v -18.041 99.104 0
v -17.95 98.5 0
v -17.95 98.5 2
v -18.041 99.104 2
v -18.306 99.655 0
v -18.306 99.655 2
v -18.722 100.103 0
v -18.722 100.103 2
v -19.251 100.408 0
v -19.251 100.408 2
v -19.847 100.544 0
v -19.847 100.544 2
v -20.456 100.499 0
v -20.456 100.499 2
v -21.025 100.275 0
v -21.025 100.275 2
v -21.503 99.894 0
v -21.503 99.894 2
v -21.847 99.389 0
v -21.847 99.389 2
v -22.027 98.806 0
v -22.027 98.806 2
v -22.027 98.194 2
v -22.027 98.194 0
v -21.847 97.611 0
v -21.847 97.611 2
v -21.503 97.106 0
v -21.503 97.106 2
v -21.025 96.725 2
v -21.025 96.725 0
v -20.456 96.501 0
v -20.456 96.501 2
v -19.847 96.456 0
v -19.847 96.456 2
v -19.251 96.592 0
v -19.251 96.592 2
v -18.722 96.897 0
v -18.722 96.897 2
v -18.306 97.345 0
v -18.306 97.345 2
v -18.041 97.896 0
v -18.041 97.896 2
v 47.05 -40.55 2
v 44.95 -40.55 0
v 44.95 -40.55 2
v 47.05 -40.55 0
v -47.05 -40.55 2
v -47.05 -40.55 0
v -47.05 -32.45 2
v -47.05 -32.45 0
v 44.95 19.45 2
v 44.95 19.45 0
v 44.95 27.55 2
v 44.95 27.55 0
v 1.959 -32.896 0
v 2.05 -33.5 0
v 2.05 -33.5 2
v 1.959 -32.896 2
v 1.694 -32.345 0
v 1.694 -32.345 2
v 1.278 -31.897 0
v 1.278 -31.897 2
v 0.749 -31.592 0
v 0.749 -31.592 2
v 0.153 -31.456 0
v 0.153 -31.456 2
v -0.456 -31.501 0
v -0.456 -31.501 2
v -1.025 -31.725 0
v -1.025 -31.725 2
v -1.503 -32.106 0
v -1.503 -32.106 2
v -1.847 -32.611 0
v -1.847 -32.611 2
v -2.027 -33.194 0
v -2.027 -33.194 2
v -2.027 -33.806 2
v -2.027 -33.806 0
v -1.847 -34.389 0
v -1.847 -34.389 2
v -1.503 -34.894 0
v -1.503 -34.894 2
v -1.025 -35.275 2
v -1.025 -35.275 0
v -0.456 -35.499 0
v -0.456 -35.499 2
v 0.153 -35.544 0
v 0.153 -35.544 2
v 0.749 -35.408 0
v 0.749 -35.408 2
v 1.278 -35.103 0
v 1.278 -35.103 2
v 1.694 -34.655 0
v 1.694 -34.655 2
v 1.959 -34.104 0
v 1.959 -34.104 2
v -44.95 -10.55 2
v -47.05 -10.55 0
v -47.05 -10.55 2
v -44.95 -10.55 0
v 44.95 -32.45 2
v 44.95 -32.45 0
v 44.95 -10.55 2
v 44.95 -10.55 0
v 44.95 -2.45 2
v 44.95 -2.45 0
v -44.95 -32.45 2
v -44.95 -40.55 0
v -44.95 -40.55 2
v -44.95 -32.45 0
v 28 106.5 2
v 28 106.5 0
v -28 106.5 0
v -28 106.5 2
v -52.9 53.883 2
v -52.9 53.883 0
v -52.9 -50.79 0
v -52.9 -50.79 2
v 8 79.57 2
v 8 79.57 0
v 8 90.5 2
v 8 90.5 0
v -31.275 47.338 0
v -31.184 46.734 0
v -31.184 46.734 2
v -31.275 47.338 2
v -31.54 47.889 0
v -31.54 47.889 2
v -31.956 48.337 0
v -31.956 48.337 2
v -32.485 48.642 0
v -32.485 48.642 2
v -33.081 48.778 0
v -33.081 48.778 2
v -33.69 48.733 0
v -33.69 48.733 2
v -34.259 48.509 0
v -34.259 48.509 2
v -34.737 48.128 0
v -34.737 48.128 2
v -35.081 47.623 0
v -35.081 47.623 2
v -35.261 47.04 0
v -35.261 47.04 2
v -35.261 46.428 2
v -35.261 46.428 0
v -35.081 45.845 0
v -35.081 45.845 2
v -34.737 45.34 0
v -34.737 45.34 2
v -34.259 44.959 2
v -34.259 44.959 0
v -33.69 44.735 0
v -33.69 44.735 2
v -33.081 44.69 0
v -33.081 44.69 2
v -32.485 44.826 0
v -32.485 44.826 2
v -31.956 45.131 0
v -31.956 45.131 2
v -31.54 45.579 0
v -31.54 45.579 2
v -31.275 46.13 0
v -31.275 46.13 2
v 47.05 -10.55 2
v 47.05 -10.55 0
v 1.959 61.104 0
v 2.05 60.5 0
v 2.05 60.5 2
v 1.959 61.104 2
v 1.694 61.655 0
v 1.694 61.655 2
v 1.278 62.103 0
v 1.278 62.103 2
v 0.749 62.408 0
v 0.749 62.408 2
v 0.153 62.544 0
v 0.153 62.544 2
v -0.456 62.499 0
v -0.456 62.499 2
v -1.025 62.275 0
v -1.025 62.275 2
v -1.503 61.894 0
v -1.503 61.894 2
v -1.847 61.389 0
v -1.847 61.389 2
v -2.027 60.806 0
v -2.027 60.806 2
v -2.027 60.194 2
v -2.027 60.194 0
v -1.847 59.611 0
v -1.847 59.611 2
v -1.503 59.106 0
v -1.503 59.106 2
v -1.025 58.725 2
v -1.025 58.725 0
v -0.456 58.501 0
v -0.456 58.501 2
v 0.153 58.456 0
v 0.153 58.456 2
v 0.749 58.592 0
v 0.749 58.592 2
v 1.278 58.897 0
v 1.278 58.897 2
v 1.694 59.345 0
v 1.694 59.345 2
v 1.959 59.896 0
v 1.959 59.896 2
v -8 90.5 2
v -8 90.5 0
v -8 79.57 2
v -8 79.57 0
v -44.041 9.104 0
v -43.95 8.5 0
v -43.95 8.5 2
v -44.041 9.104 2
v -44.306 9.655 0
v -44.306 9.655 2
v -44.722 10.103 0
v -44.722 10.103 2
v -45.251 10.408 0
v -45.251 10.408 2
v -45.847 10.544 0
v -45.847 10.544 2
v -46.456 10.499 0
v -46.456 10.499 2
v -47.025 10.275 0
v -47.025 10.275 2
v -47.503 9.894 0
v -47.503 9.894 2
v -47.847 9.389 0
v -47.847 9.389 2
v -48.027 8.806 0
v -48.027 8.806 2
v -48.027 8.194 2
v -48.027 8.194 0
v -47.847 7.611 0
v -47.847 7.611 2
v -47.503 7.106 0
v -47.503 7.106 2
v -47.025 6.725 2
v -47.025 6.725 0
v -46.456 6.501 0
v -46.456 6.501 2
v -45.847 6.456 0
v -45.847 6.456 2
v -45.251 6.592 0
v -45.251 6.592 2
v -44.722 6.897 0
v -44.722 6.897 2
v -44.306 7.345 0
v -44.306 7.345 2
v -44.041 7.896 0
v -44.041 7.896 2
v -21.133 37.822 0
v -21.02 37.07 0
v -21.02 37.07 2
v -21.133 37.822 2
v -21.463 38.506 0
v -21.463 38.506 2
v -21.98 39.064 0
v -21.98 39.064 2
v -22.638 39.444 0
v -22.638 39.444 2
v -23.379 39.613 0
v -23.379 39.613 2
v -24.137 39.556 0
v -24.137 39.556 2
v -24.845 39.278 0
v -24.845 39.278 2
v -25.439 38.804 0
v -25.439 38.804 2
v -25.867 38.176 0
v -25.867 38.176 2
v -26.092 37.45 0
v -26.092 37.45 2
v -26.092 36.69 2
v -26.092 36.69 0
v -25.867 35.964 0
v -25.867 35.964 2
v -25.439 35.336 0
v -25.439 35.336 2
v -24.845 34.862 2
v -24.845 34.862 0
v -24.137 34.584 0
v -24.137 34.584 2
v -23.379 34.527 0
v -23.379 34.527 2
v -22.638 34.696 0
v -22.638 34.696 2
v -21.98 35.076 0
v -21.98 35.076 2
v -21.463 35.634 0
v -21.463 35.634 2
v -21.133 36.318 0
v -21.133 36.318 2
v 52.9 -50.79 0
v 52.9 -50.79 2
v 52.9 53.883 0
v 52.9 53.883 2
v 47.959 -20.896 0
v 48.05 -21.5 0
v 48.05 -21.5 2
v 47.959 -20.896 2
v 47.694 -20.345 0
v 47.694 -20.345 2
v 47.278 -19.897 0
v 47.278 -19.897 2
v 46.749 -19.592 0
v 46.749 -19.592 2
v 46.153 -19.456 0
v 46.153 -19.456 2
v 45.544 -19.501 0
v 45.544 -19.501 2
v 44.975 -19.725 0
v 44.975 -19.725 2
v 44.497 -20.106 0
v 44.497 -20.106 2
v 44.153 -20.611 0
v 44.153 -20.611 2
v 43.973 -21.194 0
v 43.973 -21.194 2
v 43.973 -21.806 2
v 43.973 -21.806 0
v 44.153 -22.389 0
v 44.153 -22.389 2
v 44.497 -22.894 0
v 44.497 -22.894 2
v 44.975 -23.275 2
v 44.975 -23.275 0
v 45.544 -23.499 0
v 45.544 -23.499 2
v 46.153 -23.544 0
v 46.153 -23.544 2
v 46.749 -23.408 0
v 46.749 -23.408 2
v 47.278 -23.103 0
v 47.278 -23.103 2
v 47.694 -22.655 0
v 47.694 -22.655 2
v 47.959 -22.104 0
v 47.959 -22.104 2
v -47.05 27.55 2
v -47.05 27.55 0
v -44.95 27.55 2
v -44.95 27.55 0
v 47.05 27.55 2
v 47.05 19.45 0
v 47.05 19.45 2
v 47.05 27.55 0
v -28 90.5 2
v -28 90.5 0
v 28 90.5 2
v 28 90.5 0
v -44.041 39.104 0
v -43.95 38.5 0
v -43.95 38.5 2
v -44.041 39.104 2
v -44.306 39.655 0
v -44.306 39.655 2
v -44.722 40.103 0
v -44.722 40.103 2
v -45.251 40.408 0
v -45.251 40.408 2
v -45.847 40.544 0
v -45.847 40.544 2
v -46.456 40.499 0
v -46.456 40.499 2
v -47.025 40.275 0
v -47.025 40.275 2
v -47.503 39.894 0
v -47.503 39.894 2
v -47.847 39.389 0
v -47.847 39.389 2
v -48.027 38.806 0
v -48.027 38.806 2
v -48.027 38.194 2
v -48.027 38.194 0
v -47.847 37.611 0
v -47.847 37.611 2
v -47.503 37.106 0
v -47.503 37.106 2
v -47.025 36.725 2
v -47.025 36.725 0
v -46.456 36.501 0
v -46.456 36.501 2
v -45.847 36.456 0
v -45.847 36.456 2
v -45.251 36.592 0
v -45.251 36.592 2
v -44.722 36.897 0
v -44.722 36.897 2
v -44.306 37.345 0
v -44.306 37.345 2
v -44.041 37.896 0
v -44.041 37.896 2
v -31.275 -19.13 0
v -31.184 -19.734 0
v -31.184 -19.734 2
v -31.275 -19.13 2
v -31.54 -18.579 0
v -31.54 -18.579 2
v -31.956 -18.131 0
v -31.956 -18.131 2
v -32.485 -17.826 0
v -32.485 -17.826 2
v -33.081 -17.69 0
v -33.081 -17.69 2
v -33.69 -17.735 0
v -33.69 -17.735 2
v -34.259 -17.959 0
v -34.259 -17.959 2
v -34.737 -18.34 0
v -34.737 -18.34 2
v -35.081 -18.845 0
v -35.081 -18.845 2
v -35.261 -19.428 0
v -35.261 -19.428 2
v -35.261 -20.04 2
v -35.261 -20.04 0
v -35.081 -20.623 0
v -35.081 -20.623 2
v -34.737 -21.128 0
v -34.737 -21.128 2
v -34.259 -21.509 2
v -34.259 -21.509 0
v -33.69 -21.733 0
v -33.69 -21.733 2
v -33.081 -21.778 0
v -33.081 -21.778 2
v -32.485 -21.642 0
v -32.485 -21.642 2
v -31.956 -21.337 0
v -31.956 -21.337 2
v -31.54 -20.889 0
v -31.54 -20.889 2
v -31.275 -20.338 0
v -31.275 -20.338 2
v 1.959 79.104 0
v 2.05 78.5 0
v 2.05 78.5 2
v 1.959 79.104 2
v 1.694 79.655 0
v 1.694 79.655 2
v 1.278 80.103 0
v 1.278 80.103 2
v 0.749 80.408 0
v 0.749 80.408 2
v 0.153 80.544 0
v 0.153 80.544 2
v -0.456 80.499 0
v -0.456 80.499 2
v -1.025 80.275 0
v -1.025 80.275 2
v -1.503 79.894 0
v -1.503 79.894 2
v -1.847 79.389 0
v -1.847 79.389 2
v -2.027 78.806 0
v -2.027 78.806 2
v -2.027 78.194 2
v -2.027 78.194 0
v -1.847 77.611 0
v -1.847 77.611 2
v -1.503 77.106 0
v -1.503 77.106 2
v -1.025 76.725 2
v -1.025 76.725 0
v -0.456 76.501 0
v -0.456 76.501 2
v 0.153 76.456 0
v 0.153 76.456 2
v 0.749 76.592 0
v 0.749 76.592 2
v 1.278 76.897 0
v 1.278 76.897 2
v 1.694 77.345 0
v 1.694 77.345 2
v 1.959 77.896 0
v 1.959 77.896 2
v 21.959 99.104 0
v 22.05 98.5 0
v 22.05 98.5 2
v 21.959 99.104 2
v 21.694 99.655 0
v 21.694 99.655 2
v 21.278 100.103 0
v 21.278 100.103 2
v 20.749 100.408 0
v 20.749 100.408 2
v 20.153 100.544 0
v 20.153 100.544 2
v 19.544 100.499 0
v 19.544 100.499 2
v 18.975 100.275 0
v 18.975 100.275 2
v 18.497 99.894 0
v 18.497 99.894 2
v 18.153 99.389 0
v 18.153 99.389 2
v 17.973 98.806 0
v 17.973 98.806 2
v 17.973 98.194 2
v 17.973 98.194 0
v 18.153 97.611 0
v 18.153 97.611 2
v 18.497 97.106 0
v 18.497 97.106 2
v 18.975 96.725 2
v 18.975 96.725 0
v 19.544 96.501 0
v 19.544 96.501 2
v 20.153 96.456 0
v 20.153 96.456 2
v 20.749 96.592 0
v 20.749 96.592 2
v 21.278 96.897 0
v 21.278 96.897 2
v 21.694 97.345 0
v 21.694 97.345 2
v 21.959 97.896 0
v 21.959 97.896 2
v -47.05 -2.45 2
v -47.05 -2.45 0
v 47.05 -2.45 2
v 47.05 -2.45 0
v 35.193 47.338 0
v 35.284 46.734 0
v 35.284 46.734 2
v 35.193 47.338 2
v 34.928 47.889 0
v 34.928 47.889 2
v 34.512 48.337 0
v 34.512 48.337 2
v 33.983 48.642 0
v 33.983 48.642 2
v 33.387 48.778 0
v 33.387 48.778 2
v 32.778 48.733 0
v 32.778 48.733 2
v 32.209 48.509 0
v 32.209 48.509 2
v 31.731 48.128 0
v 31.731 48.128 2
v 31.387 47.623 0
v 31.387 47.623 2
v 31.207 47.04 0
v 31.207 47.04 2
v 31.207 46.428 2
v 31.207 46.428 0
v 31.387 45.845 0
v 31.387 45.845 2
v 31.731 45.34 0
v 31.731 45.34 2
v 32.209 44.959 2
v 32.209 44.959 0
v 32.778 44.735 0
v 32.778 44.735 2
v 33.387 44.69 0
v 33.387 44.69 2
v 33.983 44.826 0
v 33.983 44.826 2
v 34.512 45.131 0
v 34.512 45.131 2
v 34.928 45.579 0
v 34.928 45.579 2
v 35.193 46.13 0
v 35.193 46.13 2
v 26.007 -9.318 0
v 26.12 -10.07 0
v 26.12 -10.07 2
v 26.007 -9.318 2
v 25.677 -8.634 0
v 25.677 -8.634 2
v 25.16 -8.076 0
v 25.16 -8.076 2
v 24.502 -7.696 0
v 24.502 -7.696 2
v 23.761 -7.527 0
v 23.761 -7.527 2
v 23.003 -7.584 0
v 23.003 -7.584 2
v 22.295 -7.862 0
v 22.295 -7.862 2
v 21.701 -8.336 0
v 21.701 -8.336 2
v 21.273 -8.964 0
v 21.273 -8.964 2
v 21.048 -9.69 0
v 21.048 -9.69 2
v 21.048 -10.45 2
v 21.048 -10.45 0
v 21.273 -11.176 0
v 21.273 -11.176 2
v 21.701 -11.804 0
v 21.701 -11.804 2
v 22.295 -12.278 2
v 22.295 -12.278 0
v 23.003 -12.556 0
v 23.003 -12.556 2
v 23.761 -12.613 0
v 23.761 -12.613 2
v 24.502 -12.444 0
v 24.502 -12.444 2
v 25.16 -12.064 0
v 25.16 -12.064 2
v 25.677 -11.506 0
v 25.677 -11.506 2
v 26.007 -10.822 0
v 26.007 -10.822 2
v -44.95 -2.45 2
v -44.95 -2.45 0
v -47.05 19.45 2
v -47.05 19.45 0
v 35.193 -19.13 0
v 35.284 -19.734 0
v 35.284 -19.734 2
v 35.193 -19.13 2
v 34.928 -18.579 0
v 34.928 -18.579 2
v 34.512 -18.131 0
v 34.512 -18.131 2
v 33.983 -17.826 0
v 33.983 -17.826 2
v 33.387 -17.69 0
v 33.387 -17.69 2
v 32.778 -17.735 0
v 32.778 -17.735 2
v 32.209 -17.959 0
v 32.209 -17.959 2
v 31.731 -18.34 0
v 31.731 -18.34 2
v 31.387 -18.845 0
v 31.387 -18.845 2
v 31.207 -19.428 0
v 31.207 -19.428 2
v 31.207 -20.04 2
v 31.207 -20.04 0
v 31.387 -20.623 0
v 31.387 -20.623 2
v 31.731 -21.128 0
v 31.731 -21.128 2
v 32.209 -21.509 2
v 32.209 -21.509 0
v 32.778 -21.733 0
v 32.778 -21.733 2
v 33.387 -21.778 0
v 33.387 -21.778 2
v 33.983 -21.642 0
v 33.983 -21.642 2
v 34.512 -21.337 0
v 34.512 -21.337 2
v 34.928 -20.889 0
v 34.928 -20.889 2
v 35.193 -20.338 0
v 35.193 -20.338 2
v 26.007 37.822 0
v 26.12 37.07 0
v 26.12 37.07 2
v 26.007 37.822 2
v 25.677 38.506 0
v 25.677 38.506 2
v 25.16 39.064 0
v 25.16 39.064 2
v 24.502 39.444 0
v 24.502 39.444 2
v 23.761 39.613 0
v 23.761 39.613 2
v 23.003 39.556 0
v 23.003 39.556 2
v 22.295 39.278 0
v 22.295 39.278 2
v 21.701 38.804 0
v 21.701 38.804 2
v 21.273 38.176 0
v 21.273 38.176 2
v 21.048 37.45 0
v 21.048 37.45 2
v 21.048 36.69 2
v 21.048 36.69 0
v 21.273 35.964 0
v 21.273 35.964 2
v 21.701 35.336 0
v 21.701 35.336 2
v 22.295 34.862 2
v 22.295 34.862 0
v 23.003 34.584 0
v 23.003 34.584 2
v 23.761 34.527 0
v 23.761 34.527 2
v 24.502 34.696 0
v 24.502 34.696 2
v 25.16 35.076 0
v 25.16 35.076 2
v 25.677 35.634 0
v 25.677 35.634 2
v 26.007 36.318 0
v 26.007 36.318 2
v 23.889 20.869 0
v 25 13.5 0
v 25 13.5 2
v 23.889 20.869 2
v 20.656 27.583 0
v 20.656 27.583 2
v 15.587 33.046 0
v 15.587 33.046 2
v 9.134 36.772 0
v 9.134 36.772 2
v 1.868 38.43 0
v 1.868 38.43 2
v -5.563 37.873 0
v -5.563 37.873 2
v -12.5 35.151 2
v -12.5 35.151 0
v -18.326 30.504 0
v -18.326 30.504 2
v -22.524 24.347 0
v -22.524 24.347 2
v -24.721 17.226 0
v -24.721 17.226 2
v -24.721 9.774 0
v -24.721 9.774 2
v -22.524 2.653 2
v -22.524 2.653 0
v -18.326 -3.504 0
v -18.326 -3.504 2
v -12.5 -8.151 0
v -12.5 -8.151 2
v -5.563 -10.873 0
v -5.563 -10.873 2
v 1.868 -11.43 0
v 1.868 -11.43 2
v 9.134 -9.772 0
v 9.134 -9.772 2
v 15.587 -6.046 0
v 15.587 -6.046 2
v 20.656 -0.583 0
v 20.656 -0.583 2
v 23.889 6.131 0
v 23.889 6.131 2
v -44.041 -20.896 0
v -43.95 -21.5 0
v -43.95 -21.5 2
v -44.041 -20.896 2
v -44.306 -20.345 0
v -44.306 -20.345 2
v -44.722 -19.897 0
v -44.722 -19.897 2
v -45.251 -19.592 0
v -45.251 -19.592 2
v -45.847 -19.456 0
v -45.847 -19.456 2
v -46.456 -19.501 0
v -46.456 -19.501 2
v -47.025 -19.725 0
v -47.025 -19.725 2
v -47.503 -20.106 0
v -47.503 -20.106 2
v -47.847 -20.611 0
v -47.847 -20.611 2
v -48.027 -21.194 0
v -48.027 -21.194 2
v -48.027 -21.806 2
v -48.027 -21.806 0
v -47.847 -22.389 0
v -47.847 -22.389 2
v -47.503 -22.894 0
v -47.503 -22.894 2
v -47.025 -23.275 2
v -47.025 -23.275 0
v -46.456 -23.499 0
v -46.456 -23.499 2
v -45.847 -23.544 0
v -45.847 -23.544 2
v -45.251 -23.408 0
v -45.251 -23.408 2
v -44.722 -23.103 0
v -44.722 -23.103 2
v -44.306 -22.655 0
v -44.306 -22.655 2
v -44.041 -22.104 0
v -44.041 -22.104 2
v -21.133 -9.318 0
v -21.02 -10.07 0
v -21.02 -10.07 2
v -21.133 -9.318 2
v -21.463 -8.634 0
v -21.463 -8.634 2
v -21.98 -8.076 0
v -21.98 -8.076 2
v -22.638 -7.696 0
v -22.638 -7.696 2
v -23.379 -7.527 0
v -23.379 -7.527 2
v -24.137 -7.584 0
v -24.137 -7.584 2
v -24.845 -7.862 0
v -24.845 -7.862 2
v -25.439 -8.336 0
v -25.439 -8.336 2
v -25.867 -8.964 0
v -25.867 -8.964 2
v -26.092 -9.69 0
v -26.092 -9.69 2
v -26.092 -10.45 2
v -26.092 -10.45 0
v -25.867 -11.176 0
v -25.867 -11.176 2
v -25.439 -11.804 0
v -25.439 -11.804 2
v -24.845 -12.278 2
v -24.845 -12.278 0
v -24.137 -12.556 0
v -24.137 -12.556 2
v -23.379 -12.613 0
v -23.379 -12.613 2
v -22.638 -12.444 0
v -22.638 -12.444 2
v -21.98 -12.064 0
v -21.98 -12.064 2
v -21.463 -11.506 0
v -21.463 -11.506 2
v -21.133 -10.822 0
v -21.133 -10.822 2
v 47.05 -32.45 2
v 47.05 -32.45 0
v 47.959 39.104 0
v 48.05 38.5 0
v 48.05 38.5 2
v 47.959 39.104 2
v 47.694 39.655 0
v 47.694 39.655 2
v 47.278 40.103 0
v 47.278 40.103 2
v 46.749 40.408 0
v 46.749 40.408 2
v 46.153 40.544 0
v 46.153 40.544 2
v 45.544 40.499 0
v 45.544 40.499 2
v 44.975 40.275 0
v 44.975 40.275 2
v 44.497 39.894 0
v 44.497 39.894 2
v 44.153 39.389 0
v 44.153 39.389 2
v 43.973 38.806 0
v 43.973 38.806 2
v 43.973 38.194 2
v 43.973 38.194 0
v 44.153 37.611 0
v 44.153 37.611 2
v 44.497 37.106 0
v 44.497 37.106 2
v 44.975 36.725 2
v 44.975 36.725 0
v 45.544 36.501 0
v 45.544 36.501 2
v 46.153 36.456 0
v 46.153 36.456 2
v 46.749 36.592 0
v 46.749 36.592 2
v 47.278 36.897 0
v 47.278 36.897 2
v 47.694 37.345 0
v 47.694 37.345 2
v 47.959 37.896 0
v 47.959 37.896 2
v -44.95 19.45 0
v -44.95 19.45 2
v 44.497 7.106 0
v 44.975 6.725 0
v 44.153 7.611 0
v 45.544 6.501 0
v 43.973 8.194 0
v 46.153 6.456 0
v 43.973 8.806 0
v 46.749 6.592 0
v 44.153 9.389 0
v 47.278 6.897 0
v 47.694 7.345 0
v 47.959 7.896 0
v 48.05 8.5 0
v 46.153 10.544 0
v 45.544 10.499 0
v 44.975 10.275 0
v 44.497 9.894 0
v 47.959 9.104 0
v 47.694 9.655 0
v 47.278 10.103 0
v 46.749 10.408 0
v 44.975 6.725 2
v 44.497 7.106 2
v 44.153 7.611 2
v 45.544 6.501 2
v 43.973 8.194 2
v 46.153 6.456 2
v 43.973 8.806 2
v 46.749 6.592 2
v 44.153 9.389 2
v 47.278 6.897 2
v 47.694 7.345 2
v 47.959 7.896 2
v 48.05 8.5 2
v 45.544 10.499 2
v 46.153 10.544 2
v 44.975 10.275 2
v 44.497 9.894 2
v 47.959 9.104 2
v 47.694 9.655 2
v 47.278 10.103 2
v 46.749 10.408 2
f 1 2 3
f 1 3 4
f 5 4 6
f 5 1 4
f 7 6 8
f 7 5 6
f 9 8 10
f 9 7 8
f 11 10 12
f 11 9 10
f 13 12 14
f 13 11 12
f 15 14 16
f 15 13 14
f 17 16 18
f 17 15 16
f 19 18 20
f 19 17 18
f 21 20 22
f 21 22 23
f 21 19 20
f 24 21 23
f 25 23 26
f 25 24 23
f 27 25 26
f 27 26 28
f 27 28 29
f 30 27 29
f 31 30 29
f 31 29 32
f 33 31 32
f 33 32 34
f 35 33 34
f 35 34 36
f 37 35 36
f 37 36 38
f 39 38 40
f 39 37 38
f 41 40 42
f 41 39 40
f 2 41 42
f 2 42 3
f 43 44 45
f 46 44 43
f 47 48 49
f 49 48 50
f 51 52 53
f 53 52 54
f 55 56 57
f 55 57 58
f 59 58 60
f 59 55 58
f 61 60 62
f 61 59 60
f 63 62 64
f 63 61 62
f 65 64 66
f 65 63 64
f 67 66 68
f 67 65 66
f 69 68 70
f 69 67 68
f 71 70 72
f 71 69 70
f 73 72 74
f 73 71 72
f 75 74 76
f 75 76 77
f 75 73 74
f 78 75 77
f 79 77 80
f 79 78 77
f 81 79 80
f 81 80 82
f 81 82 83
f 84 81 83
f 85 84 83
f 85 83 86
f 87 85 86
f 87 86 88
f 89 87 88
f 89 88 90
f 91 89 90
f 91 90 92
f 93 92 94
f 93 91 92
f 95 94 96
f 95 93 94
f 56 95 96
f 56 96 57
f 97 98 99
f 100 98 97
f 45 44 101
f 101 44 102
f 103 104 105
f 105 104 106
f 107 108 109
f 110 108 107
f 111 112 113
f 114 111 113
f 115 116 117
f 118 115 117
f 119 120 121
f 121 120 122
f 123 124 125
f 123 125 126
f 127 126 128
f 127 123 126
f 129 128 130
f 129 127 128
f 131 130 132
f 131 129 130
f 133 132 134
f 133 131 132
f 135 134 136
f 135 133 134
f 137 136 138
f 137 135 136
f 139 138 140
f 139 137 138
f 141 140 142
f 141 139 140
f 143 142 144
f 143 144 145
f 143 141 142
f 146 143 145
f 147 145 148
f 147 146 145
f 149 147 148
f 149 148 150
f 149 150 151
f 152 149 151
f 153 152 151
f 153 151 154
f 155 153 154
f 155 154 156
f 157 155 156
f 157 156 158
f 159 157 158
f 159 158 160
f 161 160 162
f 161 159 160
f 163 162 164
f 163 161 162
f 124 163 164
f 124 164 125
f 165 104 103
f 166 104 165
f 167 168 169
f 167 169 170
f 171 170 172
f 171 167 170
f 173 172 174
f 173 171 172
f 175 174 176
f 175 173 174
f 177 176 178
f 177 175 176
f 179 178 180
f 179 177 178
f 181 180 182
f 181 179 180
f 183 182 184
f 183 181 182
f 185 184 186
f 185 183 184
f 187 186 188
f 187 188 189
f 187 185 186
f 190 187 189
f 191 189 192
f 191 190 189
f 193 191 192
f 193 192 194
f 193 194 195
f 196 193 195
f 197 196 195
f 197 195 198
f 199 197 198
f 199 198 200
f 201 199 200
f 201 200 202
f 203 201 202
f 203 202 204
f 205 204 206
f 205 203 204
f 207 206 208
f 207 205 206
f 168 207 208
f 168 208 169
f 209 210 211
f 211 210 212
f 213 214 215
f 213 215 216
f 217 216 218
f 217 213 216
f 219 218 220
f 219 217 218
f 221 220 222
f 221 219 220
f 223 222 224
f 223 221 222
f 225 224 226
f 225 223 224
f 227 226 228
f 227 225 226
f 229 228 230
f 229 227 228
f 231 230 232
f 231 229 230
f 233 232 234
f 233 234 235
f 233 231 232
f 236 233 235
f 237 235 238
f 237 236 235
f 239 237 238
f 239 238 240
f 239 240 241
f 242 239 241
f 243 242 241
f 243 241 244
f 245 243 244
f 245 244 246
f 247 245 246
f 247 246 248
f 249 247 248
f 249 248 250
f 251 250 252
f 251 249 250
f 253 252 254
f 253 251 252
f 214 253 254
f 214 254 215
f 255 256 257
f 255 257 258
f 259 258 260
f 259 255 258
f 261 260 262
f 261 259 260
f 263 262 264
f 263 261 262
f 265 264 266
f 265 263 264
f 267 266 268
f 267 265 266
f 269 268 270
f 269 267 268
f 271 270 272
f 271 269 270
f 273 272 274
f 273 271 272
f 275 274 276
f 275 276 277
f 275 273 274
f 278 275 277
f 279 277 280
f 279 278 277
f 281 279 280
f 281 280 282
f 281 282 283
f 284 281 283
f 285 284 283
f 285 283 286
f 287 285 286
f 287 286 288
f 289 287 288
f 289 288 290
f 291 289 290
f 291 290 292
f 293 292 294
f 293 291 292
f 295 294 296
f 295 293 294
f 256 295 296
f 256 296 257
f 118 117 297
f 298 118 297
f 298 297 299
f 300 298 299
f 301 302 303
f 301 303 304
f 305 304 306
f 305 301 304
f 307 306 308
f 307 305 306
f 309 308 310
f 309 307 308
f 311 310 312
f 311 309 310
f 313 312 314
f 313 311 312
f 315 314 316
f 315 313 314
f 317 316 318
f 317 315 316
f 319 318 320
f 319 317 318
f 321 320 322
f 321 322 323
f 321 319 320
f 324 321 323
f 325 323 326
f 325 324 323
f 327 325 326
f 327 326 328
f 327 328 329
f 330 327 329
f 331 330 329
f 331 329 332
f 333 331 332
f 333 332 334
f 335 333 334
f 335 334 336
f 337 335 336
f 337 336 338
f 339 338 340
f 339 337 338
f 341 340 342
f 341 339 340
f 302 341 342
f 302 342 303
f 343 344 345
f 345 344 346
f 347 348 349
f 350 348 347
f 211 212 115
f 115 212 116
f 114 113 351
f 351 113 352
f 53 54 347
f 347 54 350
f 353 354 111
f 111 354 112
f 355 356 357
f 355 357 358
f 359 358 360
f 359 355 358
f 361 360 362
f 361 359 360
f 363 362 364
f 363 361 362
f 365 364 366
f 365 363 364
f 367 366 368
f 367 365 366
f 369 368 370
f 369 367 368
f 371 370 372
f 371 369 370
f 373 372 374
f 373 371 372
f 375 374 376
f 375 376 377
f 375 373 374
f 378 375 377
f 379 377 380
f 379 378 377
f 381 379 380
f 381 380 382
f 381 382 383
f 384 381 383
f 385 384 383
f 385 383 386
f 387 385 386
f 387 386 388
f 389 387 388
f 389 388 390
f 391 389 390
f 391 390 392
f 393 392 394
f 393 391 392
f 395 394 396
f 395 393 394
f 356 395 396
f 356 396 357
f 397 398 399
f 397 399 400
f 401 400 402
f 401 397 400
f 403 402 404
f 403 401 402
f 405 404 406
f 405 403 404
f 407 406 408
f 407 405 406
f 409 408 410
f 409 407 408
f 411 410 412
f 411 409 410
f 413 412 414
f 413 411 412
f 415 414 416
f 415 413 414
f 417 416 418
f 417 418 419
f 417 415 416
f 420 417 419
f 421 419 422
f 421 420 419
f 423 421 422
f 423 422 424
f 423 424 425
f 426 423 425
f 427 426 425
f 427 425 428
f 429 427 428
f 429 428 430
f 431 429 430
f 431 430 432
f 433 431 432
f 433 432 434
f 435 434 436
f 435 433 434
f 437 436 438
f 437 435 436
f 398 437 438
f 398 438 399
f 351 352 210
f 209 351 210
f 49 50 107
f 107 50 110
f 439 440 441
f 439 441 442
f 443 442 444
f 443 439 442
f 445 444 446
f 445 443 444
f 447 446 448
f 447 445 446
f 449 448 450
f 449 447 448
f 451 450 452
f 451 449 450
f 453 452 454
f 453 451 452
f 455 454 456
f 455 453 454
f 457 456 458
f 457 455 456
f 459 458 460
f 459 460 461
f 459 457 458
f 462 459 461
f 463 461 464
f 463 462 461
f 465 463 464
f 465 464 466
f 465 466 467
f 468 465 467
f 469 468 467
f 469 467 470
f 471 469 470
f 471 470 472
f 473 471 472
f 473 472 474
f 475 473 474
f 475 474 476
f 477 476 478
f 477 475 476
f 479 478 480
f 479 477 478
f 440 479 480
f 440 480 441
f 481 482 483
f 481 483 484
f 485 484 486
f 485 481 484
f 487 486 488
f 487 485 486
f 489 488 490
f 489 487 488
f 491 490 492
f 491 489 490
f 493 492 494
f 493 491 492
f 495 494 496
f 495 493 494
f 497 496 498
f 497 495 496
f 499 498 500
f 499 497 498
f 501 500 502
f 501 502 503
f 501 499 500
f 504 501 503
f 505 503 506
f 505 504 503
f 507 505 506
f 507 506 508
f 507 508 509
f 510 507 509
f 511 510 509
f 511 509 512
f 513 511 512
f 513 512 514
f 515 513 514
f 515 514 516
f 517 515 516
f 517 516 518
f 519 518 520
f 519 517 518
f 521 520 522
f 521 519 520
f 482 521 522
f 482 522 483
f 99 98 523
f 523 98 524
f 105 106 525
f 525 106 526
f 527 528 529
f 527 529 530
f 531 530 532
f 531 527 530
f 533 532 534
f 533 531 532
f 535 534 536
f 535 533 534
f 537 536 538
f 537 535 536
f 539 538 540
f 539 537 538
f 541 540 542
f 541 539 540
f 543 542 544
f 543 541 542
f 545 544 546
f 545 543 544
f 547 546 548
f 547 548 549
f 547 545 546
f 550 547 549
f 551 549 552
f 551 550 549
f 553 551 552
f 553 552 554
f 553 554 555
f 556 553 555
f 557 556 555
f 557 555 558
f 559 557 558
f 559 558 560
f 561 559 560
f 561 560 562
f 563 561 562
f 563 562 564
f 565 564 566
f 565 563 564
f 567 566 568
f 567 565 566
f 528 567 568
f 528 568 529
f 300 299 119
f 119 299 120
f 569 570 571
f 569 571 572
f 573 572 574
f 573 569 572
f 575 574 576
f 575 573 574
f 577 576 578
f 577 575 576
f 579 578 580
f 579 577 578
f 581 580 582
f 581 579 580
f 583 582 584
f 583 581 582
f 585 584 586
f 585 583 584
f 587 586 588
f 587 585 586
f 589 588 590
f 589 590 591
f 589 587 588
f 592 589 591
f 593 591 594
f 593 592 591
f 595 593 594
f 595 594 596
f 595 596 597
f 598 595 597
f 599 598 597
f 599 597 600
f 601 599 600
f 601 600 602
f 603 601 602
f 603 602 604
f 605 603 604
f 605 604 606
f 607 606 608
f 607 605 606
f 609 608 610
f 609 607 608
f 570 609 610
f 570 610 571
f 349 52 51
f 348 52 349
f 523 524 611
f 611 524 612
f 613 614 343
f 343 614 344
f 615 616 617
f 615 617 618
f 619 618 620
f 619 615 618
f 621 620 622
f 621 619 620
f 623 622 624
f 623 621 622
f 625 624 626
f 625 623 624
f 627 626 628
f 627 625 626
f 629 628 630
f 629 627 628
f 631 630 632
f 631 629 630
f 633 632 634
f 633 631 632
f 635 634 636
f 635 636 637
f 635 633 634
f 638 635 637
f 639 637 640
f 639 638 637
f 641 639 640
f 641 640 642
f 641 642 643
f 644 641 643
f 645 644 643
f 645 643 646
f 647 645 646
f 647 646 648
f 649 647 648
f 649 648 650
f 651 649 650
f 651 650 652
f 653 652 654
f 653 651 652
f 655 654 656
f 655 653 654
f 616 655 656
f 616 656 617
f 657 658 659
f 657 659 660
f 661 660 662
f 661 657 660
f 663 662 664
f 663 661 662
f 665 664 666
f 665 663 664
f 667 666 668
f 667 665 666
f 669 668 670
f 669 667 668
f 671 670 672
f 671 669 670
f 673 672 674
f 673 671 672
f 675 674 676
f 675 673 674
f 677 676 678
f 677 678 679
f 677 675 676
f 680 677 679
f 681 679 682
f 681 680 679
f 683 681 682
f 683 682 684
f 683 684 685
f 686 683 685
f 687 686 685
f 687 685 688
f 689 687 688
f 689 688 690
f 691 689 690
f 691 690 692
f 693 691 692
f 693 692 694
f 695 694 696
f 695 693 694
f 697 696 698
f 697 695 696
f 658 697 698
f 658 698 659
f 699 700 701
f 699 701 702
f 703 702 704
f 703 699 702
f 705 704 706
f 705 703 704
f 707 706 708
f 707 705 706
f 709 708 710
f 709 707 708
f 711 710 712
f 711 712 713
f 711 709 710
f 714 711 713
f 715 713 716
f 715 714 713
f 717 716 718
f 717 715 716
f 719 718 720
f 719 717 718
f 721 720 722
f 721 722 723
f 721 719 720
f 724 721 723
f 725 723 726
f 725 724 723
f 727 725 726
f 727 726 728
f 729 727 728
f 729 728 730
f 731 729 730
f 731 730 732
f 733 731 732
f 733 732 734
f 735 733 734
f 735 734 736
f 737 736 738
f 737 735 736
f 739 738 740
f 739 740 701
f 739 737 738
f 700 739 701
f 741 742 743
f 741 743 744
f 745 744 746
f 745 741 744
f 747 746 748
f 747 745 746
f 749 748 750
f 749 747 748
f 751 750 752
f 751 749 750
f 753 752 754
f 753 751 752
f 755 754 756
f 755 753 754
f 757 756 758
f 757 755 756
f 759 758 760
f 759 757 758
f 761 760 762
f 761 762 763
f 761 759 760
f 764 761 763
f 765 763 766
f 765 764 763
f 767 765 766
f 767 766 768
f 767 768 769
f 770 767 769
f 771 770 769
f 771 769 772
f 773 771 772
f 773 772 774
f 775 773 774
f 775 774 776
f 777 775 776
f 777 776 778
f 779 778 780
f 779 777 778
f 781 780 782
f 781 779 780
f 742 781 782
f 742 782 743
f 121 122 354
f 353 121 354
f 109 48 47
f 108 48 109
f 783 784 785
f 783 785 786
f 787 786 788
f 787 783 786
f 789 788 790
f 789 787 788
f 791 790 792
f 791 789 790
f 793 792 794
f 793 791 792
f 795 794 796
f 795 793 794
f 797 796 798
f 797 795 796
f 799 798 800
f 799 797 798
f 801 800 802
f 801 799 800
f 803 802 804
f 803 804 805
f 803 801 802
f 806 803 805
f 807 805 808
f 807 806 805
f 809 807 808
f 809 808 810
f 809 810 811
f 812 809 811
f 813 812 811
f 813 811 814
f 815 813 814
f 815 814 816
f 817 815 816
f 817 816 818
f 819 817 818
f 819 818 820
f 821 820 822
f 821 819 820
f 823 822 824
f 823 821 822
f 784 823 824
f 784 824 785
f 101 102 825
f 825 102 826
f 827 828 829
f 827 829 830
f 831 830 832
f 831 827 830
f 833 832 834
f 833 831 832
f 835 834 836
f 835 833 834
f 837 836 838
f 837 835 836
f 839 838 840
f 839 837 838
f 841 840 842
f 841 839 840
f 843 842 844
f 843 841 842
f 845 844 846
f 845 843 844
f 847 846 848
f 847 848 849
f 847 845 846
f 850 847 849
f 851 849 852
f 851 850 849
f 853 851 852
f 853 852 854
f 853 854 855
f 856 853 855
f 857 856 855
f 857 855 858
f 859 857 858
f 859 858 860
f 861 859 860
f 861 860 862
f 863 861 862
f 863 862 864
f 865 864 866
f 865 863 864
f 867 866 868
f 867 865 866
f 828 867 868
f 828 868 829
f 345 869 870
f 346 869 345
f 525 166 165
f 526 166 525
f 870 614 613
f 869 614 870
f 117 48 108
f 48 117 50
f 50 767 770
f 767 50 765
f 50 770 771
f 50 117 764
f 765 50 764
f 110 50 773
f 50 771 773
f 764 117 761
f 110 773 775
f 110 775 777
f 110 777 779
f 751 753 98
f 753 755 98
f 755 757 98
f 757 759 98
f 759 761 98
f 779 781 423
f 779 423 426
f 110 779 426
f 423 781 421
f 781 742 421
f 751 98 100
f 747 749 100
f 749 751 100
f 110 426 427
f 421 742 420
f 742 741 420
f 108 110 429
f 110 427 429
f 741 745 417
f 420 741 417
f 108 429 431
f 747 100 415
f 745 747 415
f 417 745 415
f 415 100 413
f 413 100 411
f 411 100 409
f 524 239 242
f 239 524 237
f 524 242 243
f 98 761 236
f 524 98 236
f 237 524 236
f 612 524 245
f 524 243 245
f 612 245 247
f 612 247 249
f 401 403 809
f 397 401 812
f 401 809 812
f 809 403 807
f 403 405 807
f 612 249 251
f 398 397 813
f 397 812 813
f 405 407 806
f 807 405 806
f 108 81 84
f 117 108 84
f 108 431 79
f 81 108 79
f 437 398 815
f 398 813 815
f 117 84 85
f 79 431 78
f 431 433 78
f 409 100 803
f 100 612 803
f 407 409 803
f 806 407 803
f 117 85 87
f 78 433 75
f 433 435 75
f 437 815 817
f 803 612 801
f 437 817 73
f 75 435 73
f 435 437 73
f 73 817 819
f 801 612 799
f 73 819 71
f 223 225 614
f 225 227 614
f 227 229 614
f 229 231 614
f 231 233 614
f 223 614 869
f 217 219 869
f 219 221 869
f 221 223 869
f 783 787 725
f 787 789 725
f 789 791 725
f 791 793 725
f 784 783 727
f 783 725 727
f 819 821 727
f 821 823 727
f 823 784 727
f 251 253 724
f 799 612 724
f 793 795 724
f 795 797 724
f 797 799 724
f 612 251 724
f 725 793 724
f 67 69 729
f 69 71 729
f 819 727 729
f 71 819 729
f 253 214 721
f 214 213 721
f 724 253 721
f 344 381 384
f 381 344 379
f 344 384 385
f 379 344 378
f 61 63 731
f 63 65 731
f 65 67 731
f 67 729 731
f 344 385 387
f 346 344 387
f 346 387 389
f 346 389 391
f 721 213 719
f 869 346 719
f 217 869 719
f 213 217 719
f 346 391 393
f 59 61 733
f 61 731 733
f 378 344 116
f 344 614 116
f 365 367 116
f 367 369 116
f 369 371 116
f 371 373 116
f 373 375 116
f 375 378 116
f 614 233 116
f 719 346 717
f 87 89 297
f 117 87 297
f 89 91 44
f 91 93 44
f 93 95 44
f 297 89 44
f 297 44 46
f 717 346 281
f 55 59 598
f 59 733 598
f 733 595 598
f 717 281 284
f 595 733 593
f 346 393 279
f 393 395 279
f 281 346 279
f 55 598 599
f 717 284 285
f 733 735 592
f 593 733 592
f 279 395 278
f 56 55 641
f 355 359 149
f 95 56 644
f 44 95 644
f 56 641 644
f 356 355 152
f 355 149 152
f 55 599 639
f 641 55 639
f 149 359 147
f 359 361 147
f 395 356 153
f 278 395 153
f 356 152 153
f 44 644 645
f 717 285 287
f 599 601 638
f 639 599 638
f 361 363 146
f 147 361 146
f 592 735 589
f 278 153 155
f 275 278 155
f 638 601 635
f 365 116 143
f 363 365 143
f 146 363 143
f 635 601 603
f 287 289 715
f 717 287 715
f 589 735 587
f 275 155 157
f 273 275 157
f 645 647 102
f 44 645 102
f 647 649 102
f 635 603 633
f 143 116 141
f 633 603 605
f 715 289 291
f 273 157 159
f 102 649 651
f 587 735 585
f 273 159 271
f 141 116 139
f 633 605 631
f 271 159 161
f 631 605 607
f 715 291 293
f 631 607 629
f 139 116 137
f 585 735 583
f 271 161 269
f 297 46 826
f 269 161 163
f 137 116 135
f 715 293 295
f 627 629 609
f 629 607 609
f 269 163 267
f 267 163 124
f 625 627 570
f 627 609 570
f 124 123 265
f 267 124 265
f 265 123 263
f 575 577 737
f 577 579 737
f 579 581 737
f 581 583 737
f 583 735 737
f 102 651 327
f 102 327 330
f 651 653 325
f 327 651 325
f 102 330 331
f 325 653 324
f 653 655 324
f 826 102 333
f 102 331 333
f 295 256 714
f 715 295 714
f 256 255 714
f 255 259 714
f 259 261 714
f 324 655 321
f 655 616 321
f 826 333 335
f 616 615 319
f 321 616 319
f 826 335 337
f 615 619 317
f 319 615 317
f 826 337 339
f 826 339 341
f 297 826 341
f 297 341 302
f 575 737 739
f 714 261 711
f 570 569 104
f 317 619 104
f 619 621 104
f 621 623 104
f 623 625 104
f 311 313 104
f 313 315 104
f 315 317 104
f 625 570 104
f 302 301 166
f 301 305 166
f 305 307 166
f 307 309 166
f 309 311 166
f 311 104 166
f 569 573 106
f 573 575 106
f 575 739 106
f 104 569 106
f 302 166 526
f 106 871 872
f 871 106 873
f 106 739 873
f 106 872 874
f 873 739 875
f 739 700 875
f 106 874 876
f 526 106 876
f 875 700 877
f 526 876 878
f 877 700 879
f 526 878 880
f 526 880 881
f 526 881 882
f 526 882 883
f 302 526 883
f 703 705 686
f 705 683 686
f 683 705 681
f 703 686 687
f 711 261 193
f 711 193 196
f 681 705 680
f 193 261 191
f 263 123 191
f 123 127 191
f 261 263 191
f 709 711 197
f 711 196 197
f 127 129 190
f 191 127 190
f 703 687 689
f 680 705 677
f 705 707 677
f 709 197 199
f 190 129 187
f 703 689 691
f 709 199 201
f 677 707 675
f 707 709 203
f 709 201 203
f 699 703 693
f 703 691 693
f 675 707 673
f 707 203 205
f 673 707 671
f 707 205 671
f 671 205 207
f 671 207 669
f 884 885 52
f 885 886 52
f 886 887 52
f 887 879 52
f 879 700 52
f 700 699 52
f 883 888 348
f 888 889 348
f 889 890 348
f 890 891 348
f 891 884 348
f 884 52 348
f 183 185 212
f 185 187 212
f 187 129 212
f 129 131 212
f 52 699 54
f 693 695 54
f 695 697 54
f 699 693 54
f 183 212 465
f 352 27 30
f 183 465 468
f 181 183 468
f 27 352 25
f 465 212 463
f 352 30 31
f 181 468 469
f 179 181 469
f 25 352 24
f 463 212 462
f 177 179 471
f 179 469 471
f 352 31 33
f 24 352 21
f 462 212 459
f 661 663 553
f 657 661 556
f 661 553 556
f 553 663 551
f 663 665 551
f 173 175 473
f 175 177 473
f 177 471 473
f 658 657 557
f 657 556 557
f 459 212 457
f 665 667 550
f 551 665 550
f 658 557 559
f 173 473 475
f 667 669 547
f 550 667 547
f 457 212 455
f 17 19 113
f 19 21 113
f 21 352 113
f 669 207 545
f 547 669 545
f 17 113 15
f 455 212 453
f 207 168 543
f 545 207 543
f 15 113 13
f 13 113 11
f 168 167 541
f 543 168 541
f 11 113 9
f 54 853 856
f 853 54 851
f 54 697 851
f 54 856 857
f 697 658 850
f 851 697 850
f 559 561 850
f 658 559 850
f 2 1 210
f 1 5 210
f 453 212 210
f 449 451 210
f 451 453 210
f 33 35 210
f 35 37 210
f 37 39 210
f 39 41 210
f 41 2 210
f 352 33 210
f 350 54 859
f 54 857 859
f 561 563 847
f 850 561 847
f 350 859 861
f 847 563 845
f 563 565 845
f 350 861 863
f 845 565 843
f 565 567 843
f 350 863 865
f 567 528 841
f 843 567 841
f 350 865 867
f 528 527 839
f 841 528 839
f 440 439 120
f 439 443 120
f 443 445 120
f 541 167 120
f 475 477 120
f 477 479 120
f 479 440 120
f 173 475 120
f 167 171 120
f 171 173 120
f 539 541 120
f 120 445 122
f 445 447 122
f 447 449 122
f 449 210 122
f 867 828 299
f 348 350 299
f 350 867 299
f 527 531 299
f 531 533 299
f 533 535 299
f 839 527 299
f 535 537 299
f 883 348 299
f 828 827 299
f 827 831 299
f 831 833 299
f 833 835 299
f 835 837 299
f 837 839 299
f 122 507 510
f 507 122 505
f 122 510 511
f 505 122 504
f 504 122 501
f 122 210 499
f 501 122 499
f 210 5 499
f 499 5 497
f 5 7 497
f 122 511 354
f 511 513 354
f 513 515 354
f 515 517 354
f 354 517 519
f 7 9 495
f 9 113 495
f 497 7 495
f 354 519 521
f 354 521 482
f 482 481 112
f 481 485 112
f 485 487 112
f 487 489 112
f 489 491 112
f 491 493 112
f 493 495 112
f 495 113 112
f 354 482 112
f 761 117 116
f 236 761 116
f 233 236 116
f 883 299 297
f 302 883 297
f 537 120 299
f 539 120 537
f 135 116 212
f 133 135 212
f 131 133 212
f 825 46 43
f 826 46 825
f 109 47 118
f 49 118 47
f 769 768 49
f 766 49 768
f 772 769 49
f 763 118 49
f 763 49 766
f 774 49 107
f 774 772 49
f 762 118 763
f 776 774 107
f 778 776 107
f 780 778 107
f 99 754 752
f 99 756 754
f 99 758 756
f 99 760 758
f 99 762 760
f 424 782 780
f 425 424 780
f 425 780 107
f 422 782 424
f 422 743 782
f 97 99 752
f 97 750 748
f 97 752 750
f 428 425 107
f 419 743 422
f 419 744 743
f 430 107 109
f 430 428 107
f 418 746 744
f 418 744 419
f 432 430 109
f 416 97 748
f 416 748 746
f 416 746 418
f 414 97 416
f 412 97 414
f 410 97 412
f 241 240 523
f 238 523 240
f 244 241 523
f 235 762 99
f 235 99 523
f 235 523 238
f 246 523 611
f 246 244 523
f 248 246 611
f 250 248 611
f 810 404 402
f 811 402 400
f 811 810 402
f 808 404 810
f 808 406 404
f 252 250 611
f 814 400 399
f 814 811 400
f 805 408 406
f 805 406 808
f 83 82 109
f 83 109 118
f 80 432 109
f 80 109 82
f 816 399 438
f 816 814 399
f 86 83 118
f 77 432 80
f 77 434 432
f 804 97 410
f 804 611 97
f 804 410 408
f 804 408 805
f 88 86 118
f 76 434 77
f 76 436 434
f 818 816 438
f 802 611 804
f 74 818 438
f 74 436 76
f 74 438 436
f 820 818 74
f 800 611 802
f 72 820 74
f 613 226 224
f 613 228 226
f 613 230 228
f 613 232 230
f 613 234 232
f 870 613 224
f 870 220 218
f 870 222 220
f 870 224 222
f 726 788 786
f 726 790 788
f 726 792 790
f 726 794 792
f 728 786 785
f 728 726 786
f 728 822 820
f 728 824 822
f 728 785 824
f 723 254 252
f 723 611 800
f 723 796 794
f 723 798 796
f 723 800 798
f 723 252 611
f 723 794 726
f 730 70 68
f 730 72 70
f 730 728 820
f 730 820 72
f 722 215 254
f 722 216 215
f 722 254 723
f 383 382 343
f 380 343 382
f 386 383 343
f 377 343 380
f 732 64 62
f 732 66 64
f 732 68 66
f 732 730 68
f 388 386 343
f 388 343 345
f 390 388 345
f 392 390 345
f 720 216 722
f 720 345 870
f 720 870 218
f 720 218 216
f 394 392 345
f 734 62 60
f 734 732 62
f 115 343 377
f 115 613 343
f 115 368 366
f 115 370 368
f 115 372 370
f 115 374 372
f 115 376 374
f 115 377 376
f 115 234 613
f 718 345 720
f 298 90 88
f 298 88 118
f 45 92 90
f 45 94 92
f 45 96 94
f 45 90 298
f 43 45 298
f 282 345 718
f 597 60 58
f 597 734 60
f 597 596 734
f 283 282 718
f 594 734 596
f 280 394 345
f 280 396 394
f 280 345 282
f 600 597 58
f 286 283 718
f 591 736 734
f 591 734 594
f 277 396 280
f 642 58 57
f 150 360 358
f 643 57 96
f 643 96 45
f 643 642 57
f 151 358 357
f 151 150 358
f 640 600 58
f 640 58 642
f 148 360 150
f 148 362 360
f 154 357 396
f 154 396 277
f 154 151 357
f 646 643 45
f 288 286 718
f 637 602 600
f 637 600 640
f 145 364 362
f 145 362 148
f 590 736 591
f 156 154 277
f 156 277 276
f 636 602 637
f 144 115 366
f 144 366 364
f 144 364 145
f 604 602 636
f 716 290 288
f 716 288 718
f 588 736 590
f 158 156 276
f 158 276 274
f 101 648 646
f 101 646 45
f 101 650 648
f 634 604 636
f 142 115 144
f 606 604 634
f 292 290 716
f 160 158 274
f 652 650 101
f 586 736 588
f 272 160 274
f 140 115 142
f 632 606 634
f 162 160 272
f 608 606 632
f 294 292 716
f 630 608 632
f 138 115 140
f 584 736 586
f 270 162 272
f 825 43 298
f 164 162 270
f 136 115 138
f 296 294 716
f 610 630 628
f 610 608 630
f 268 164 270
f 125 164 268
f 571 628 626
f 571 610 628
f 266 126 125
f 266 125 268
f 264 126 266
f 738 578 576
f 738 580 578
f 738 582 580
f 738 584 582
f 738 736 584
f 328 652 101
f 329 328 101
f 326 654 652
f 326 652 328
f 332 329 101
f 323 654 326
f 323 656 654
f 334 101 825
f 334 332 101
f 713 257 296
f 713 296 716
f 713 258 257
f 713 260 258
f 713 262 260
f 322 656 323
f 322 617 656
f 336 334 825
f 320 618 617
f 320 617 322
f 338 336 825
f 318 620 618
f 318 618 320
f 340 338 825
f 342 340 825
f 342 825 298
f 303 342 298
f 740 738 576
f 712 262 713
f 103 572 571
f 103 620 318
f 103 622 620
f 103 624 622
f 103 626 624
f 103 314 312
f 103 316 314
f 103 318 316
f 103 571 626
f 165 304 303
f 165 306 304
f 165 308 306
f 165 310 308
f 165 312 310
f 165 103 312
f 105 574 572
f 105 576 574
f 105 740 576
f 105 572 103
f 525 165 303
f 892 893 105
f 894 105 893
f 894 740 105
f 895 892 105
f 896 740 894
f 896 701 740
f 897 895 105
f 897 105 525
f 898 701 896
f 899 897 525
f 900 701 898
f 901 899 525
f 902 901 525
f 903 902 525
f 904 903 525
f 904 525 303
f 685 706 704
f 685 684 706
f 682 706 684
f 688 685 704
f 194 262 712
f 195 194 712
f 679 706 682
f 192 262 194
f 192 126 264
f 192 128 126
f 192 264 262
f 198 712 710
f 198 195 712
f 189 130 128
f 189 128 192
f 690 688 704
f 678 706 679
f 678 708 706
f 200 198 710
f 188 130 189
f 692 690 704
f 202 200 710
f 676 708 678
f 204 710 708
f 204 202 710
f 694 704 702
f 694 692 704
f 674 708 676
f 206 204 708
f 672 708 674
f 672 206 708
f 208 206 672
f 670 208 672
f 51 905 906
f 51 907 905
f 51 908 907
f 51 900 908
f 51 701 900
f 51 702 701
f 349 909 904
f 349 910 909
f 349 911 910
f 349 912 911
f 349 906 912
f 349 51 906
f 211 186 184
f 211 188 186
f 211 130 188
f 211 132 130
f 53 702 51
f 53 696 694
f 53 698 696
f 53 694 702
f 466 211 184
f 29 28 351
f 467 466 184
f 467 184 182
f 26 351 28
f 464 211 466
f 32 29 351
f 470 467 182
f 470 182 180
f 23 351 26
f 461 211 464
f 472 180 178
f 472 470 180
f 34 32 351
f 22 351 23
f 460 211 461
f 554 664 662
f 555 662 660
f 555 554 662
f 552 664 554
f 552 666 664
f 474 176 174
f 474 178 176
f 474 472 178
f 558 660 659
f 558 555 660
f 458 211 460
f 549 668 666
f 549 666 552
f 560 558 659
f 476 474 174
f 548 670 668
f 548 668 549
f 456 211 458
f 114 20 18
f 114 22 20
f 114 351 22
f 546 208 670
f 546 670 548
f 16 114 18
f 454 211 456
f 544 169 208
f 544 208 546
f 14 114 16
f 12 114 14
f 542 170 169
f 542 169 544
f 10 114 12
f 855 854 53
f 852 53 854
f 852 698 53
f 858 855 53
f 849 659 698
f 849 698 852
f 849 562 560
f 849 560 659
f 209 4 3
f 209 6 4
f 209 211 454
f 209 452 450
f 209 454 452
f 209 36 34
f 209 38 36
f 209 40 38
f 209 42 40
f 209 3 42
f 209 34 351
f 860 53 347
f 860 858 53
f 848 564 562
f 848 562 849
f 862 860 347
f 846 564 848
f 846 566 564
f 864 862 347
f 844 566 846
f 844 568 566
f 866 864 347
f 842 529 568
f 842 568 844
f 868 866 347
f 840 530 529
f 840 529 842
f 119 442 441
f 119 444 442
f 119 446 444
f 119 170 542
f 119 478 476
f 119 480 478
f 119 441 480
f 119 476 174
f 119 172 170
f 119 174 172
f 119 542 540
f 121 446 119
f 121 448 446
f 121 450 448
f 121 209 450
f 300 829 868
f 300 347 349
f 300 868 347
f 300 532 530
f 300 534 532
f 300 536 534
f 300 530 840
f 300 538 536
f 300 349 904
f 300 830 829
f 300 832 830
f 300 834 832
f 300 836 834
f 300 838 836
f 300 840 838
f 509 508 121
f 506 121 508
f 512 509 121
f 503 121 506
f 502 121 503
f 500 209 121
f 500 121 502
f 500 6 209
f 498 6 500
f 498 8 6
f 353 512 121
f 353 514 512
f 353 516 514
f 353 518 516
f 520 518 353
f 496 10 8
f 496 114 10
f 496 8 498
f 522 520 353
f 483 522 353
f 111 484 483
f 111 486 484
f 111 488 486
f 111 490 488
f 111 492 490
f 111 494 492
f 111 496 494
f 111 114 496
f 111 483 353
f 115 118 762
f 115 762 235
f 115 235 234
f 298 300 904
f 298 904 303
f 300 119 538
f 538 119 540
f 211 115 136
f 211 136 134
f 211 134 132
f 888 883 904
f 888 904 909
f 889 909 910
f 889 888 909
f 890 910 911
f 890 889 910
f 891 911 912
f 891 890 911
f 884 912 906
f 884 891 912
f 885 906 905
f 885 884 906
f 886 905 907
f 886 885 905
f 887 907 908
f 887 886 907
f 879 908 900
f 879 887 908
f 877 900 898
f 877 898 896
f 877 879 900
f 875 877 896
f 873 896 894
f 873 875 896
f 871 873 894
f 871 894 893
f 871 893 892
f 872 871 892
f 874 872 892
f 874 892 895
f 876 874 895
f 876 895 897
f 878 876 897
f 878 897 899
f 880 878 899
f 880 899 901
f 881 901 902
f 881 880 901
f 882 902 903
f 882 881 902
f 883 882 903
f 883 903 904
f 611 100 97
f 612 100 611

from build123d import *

# Parameters (mm, degrees)
SKETCH_1_R      = 2.55
SKETCH_1_R_2    = 25
SKETCH_1_R_3    = 2.05
SKETCH_1_W      = 2.1
SKETCH_1_H      = 8.1
EXTRUDE_1_DEPTH = 2


with BuildPart() as part:
    # 草图1 → 凸台-拉伸1 (new body)
    with BuildSketch(Plane.XY):
        Polygon((-52.9, 53.883164809), (-52.9, -50.790000001), (52.9, -50.790000001), (52.9, 53.883164809), (8, 79.569735886), (8, 90.5), (28, 90.5), (28, 106.5), (-28, 106.5), (-28, 90.5), (-8, 90.5), (-8, 79.569735886), align=None)
        with Locations((-23.57, 37.07)):
            Circle(SKETCH_1_R, mode=Mode.SUBTRACT)
        with Locations((-23.57, -10.07)):
            Circle(SKETCH_1_R, mode=Mode.SUBTRACT)
        with Locations((23.57, -10.07)):
            Circle(SKETCH_1_R, mode=Mode.SUBTRACT)
        with Locations((23.57, 37.07)):
            Circle(SKETCH_1_R, mode=Mode.SUBTRACT)
        with Locations((0, 13.5)):
            Circle(SKETCH_1_R_2, mode=Mode.SUBTRACT)
        with Locations((0, 60.5)):
            Circle(SKETCH_1_R_3, mode=Mode.SUBTRACT)
        with Locations((33.234018716, 46.734018716)):
            Circle(SKETCH_1_R_3, mode=Mode.SUBTRACT)
        with Locations((33.234018716, -19.734018716)):
            Circle(SKETCH_1_R_3, mode=Mode.SUBTRACT)
        with Locations((0, -33.5)):
            Circle(SKETCH_1_R_3, mode=Mode.SUBTRACT)
        with Locations((-33.234018716, -19.734018716)):
            Circle(SKETCH_1_R_3, mode=Mode.SUBTRACT)
        with Locations((-33.234018716, 46.734018716)):
            Circle(SKETCH_1_R_3, mode=Mode.SUBTRACT)
        with Locations((0, 78.5)):
            Circle(SKETCH_1_R_3, mode=Mode.SUBTRACT)
        with Locations((-20, 98.5)):
            Circle(SKETCH_1_R_3, mode=Mode.SUBTRACT)
        with Locations((20, 98.5)):
            Circle(SKETCH_1_R_3, mode=Mode.SUBTRACT)
        with Locations((-46, -21.5)):
            Circle(SKETCH_1_R_3, mode=Mode.SUBTRACT)
        with Locations((-46, 8.5)):
            Circle(SKETCH_1_R_3, mode=Mode.SUBTRACT)
        with Locations((46, 8.5)):
            Circle(SKETCH_1_R_3, mode=Mode.SUBTRACT)
        with Locations((46, -21.5)):
            Circle(SKETCH_1_R_3, mode=Mode.SUBTRACT)
        with Locations((-46, 38.5)):
            Circle(SKETCH_1_R_3, mode=Mode.SUBTRACT)
        with Locations((46, 38.5)):
            Circle(SKETCH_1_R_3, mode=Mode.SUBTRACT)
        with Locations((-46, -36.5)):
            Rectangle(SKETCH_1_W, SKETCH_1_H, mode=Mode.SUBTRACT)
        with Locations((-46, -6.5)):
            Rectangle(SKETCH_1_W, SKETCH_1_H, mode=Mode.SUBTRACT)
        with Locations((-46, 23.5)):
            Rectangle(SKETCH_1_W, SKETCH_1_H, mode=Mode.SUBTRACT)
        with Locations((46, 23.5)):
            Rectangle(SKETCH_1_W, SKETCH_1_H, mode=Mode.SUBTRACT)
        with Locations((46, -6.5)):
            Rectangle(SKETCH_1_W, SKETCH_1_H, mode=Mode.SUBTRACT)
        with Locations((46, -36.5)):
            Rectangle(SKETCH_1_W, SKETCH_1_H, mode=Mode.SUBTRACT)
    extrude(amount=EXTRUDE_1_DEPTH)


solid = part.part
